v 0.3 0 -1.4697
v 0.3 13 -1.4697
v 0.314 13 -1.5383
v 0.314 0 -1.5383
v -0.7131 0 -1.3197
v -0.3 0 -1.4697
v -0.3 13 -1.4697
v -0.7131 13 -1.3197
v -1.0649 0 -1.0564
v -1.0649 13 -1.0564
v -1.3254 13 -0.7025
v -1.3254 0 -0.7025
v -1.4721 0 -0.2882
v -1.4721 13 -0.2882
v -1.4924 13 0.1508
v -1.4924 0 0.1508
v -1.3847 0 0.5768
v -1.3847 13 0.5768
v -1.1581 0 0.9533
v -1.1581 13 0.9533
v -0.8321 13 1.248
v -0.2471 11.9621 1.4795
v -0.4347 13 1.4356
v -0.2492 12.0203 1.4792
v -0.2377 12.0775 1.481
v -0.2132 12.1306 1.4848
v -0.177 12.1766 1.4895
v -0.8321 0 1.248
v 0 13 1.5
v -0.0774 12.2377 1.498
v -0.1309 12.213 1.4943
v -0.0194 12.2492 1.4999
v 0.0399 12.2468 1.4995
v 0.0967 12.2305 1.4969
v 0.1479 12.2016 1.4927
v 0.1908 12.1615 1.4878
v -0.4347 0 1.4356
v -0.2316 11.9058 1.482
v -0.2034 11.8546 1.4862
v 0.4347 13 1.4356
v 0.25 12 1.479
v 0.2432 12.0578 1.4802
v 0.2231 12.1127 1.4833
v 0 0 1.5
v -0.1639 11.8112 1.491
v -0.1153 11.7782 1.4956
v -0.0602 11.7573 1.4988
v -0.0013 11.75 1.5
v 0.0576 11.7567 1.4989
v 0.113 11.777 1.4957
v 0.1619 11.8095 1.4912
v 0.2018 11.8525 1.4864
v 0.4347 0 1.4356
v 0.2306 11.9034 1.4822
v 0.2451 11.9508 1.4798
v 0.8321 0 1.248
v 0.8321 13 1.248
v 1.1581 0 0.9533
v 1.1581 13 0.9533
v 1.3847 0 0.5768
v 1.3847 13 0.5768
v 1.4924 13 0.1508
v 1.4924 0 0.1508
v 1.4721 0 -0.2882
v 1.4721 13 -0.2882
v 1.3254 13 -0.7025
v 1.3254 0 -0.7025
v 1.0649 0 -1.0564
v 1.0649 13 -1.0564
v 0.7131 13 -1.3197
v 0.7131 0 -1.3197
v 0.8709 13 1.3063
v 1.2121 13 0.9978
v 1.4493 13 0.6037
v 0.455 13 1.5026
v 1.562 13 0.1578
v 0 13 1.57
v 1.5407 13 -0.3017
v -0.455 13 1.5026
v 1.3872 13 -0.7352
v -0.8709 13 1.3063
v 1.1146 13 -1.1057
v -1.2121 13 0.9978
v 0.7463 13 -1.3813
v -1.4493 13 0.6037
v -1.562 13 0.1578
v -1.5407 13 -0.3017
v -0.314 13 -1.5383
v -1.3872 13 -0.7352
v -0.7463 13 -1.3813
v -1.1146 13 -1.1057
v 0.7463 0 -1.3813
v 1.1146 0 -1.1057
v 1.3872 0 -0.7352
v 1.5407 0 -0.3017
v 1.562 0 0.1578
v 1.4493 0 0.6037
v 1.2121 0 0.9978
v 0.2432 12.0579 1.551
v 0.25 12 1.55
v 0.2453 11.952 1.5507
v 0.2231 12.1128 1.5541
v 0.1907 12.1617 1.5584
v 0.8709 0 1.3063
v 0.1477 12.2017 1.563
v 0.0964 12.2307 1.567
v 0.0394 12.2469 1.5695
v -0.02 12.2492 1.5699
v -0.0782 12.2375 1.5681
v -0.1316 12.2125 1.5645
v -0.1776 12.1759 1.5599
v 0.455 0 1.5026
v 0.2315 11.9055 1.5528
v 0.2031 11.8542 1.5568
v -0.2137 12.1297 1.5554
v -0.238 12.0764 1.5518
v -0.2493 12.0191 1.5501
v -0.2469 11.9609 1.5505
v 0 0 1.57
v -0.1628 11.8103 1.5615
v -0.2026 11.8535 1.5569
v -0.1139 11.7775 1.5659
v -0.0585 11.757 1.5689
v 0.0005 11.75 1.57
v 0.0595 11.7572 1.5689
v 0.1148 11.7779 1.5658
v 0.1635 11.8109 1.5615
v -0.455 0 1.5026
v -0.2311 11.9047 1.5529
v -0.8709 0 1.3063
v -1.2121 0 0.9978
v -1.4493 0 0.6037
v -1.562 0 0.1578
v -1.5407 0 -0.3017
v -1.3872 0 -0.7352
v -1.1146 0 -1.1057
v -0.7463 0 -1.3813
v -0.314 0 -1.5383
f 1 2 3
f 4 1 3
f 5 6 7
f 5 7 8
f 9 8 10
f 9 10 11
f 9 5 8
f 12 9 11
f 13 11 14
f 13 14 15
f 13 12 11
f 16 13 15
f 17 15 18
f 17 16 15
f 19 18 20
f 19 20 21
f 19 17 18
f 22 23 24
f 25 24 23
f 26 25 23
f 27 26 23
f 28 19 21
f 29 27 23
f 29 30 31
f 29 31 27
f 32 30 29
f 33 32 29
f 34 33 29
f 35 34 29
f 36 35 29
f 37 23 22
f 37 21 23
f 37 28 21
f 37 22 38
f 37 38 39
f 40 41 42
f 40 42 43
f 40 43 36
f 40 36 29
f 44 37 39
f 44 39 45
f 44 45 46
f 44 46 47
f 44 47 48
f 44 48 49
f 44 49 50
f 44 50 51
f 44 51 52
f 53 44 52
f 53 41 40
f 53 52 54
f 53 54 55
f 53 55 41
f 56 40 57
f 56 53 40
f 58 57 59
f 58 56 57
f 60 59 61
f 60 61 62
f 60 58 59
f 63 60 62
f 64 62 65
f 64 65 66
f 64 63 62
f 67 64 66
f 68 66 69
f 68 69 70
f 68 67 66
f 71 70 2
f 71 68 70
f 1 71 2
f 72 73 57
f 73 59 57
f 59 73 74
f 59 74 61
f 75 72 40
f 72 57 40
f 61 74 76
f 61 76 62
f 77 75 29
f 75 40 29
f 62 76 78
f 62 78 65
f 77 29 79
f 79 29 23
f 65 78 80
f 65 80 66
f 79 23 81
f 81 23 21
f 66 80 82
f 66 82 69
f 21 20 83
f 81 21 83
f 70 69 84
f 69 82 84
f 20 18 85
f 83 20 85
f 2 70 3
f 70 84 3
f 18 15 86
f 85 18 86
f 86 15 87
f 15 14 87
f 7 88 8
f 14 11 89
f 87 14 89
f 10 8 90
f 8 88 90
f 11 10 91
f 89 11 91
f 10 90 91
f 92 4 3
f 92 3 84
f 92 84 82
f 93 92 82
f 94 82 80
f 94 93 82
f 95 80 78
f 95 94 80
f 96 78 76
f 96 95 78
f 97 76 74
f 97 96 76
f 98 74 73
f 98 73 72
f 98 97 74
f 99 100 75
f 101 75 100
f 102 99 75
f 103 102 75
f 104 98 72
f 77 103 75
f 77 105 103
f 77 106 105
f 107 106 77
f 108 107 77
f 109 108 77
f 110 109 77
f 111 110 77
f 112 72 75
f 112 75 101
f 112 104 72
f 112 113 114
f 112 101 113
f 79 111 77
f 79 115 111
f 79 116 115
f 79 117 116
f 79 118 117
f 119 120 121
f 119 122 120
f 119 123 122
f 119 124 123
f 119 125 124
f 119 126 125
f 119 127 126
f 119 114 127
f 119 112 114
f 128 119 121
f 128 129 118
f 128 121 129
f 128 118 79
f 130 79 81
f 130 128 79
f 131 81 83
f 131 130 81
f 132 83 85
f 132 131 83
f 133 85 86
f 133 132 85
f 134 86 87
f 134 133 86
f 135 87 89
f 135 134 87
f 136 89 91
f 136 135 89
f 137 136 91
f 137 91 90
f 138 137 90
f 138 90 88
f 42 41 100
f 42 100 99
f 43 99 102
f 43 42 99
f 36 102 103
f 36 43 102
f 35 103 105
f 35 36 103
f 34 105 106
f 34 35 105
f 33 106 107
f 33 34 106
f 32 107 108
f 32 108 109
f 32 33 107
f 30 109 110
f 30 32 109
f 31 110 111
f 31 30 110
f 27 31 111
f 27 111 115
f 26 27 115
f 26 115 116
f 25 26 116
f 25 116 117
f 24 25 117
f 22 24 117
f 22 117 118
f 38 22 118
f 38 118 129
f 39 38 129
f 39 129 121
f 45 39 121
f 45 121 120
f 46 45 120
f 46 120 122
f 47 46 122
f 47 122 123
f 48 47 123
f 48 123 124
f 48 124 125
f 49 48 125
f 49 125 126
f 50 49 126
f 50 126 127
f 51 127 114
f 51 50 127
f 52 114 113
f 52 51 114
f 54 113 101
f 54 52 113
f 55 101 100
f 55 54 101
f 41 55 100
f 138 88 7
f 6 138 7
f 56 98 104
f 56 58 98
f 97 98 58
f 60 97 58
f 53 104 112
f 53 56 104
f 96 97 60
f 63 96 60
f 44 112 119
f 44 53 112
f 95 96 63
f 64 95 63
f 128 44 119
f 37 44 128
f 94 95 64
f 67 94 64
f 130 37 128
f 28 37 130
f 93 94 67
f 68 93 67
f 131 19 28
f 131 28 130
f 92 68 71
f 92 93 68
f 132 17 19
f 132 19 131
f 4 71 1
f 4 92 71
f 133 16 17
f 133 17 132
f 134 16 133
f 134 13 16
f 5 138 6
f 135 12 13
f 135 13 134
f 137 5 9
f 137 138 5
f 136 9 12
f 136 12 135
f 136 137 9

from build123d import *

# Parameters (mm, degrees)
EXTRUDE_1_DEPTH     = 13
SKETCH_2_R          = 0.25
CUT_EXTRUDE_1_DEPTH = 2.57


with BuildPart() as part:
    # Эскиз1 → Бобышка-Вытянуть1 (new body)
    with BuildSketch(Plane(origin=(0, 0, 0), x_dir=(1, 0, 0), z_dir=(0, 1, 0))):
        with BuildLine():
            Line((-0.314, 1.538279558), (-0.3, 1.469693846))
            ThreePointArc((-0.3, 1.469693846), (0, -1.5), (0.3, 1.469693846))
            Line((0.3, 1.469693846), (0.314, 1.538279558))
            ThreePointArc((0.314, 1.538279558), (0, -1.57), (-0.314, 1.538279558))
        make_face()
    extrude(amount=EXTRUDE_1_DEPTH)

    # Эскиз2 → Вырез-Вытянуть1 (cut, through all)
    with BuildSketch(Plane.XY):
        with Locations((0, 12)):
            Circle(SKETCH_2_R)
    extrude(amount=CUT_EXTRUDE_1_DEPTH, mode=Mode.SUBTRACT)


solid = part.part
